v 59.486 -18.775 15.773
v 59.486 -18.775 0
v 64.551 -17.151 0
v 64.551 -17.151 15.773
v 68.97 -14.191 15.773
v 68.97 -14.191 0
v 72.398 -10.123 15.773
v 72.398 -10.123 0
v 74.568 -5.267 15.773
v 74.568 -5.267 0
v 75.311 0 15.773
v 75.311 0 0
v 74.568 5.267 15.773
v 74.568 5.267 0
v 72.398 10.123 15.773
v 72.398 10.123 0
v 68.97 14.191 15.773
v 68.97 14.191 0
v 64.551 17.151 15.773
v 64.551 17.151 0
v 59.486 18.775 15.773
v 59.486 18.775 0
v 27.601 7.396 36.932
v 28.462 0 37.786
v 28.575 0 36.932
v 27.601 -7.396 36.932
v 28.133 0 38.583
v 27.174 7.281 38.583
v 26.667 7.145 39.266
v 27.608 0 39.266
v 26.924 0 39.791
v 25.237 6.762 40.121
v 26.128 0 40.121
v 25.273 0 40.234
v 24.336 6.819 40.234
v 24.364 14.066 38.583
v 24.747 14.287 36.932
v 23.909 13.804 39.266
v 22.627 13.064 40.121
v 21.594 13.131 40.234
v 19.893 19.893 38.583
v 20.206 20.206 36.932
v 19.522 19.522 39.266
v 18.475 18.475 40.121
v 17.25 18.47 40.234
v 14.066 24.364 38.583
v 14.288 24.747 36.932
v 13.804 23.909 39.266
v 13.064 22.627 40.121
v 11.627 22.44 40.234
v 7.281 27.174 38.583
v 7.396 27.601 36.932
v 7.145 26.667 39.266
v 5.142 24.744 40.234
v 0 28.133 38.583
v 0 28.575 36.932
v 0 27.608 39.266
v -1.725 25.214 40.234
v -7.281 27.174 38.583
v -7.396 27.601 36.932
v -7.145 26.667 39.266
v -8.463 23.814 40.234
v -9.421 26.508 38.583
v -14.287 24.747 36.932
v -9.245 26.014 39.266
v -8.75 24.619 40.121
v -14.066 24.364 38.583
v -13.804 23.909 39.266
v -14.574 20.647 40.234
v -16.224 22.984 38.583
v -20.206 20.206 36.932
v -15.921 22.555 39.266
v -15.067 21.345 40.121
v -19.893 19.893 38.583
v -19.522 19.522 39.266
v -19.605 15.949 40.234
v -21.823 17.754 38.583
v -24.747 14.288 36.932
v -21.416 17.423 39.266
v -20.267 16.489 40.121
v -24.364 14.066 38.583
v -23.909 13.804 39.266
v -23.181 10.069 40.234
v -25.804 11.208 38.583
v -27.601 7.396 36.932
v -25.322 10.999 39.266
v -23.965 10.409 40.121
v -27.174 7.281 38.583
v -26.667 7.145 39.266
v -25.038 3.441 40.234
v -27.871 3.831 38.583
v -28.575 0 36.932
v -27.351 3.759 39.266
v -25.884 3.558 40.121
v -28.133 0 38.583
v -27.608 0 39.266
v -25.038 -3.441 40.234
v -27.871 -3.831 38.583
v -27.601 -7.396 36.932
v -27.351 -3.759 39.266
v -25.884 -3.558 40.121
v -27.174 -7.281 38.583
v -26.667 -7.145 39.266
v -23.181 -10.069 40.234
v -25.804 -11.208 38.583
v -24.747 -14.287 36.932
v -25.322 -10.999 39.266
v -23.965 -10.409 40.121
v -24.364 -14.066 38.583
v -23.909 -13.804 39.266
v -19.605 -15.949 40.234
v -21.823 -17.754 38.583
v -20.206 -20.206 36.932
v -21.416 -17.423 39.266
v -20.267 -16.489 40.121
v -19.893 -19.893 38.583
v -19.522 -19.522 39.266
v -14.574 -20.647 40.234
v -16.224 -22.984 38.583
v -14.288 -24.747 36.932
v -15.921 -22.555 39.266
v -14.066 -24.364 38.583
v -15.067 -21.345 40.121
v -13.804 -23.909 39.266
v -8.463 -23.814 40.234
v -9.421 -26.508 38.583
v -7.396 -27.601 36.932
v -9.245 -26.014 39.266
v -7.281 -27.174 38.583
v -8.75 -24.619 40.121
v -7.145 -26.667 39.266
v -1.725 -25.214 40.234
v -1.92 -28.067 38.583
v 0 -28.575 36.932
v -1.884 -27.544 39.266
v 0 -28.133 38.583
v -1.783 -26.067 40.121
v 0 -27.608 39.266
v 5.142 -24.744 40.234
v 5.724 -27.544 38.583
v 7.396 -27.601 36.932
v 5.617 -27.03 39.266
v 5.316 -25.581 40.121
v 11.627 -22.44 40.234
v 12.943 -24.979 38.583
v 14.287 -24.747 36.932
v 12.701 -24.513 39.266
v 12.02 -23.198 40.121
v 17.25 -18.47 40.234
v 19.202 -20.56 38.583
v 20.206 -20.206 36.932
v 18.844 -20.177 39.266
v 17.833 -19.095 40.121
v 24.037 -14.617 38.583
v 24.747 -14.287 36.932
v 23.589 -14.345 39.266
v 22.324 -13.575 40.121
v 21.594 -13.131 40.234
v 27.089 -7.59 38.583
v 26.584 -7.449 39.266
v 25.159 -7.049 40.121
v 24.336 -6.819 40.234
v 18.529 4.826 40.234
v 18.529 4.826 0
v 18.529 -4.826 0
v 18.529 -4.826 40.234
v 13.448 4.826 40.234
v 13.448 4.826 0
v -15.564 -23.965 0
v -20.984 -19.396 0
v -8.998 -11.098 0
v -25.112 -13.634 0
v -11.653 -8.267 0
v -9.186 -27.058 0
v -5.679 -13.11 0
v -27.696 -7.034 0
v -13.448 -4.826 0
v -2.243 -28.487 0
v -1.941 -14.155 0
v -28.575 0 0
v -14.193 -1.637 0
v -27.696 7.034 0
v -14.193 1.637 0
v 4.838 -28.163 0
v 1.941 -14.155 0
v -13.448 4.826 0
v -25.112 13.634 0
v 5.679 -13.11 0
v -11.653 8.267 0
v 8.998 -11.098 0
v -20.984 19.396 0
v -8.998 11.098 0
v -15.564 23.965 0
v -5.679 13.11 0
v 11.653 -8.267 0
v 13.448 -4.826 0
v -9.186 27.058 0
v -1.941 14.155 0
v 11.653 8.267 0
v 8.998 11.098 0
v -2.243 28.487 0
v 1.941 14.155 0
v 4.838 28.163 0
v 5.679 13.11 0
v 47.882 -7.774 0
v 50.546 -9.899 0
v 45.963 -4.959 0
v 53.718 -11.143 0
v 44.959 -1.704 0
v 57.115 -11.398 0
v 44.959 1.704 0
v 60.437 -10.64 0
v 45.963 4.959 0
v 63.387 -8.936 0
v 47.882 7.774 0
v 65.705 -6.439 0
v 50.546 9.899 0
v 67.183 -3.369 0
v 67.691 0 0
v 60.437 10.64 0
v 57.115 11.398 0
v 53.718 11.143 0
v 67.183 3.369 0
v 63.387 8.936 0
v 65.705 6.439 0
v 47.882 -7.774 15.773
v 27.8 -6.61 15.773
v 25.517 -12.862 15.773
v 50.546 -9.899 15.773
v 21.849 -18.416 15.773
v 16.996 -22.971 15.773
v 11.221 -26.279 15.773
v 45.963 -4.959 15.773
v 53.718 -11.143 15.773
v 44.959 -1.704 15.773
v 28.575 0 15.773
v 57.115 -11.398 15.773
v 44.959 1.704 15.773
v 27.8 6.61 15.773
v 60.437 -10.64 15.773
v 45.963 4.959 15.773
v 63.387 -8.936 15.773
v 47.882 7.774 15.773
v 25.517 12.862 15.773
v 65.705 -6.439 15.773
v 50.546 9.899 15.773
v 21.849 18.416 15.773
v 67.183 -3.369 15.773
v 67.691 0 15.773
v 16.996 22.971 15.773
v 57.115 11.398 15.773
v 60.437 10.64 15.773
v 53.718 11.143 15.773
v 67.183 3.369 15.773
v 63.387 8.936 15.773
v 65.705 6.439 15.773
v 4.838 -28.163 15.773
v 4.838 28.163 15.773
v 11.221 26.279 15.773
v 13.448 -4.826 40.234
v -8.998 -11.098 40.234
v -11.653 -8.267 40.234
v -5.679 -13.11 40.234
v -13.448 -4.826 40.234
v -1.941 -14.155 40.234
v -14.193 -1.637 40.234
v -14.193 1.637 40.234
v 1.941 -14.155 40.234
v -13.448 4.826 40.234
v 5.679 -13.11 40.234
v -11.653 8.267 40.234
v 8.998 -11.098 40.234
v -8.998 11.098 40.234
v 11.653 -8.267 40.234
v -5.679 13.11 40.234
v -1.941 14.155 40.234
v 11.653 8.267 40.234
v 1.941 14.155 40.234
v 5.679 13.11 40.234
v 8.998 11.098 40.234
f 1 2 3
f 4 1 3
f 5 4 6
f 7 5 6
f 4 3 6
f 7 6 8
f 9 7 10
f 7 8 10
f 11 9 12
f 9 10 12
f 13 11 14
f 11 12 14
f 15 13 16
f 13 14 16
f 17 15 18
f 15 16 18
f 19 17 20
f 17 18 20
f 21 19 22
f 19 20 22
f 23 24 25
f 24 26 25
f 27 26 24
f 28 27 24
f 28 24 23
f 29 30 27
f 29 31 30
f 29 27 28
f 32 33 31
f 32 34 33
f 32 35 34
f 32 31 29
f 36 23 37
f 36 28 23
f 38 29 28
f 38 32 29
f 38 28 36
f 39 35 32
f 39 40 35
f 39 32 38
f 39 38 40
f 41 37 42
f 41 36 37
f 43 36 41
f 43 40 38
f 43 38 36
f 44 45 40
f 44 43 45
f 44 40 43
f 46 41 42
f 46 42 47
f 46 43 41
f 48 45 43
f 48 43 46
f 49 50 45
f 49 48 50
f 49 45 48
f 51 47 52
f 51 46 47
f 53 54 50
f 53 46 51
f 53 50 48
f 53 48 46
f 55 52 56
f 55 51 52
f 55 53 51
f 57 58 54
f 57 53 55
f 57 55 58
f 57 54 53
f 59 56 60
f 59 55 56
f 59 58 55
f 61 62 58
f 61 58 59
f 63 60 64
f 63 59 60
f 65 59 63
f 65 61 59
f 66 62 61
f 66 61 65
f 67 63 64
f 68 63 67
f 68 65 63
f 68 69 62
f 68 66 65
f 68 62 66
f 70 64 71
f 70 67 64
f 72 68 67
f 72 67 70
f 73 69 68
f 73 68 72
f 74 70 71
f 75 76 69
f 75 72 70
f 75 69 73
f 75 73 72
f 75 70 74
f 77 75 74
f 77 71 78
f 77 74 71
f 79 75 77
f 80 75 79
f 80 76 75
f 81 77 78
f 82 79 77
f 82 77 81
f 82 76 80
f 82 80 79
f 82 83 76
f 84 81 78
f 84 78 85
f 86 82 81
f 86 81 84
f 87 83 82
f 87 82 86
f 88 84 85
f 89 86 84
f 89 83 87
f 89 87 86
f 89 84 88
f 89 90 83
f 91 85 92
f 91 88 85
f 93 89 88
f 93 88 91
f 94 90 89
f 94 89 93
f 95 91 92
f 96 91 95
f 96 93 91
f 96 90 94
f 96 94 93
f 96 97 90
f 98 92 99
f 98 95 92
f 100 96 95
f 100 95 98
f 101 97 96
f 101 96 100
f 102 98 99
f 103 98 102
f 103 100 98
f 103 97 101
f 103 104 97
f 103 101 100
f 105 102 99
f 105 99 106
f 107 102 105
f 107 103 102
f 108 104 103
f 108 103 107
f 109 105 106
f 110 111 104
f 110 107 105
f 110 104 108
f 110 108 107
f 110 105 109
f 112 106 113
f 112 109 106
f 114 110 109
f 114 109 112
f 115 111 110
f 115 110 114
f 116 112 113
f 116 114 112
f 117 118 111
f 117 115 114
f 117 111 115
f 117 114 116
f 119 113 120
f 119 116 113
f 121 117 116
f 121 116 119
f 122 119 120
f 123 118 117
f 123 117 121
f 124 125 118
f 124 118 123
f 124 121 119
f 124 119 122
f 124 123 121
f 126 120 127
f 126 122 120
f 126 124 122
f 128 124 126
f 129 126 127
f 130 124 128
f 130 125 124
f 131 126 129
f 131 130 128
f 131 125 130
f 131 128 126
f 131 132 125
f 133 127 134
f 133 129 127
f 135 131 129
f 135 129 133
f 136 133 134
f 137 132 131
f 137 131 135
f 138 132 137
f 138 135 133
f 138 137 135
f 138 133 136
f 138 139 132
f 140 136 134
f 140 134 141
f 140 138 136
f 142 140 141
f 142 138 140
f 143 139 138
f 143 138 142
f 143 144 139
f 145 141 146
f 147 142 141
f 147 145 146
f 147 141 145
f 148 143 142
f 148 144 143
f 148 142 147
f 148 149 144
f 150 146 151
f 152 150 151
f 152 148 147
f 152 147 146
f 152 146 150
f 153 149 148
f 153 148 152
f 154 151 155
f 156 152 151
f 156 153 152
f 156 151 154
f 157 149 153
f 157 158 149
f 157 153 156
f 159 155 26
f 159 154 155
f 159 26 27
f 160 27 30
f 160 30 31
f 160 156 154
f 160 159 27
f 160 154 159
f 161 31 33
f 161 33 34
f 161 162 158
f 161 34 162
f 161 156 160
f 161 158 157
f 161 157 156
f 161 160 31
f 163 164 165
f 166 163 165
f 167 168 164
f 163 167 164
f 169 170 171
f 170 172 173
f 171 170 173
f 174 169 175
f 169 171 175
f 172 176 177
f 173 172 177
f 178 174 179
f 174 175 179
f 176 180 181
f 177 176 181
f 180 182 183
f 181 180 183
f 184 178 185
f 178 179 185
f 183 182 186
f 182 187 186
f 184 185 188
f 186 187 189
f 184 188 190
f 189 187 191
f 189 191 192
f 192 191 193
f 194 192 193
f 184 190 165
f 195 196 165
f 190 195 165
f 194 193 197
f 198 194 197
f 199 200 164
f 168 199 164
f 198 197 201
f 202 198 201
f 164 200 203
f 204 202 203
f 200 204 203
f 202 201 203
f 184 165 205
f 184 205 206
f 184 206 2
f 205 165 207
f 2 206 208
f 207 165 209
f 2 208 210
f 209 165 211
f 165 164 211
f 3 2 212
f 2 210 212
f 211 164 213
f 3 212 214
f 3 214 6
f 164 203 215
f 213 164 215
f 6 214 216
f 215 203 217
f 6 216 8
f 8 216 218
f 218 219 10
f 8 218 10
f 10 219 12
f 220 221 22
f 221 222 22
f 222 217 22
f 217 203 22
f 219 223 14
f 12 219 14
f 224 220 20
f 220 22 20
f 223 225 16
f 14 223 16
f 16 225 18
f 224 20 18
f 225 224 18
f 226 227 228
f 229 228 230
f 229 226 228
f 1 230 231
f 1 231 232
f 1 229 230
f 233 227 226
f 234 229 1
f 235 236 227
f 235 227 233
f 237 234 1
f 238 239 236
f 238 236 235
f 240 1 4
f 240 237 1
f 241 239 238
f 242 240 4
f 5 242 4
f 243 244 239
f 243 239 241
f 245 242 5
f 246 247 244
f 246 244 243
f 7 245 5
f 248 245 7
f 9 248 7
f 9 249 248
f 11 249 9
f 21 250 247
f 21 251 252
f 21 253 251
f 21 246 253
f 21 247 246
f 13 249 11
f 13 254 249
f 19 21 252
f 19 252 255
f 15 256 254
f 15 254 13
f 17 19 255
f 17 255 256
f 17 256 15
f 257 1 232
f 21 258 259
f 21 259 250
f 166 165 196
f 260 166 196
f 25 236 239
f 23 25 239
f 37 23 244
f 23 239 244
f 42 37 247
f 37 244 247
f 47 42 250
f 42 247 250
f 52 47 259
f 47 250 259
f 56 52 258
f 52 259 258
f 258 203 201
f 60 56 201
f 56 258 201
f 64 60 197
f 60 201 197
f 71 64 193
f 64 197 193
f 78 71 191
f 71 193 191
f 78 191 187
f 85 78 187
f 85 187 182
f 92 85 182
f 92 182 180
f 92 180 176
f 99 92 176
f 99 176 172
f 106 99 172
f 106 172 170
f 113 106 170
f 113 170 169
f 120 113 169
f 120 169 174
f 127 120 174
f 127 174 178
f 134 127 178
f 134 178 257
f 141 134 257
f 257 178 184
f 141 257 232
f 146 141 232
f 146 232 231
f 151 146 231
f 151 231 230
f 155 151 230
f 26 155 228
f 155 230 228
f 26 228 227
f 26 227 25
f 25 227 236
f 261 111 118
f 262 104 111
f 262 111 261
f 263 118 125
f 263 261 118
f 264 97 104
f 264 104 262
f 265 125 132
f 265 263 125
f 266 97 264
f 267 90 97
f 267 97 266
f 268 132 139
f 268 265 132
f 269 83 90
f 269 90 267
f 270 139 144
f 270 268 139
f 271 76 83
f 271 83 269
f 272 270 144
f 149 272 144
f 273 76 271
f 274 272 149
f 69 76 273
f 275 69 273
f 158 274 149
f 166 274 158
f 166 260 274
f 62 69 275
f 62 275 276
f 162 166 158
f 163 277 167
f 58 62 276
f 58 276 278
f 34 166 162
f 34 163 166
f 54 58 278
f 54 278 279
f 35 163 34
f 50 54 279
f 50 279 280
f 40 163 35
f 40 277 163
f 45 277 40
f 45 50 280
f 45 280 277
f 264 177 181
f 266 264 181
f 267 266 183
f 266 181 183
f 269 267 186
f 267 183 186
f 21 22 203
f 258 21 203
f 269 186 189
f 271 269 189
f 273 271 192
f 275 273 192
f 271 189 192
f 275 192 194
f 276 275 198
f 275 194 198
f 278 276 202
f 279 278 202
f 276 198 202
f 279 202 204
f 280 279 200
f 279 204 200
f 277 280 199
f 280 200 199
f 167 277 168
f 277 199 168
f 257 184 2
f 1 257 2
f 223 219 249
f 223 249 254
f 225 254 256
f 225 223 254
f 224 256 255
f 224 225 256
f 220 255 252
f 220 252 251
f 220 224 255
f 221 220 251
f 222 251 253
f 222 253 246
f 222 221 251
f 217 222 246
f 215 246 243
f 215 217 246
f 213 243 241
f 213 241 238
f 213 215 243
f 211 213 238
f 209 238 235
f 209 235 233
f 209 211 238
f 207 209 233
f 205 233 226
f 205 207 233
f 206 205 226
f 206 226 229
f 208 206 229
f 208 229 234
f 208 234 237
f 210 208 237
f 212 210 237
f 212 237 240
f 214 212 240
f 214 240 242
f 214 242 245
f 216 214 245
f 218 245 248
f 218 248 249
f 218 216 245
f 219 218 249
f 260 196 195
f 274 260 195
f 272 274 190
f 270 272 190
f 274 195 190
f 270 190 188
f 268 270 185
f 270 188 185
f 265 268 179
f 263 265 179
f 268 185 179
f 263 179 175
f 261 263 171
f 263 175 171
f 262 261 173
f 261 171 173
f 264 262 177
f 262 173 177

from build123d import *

# Parameters (mm, degrees)
F0_R     = 11.43
F1_DEPTH = 15.7734
F2_DEPTH = 40.2336
F3_R     = 3.302


with BuildPart() as f1:
    # F0 (on Top) → F1 (new body)
    with BuildSketch(Plane.XY):
        with BuildLine():
            ThreePointArc((4.8377539503, 28.162506311), (21.8491354993, 18.4159143931), (28.575, 0))
            ThreePointArc((28.575, 0), (21.8491354993, -18.4159143931), (4.8377539503, -28.162506311))
            Line((4.8377539503, -28.162506311), (59.4861693002, -18.7750042073))
            ThreePointArc((59.4861693002, -18.7750042073), (37.211, 0), (59.4861693002, 18.7750042073))
            Line((59.4861693002, 18.7750042073), (4.8377539503, 28.162506311))
        make_face()
        with BuildLine():
            ThreePointArc((75.311, 0), (70.8270903328, 12.2772762621), (59.4861693002, 18.7750042073))
            ThreePointArc((59.4861693002, 18.7750042073), (37.211, 0), (59.4861693002, -18.7750042073))
            ThreePointArc((59.4861693002, -18.7750042073), (70.8270903328, -12.2772762621), (75.311, 0))
        make_face()
        with Locations((56.261, 0)):
            Circle(F0_R, mode=Mode.SUBTRACT)
    extrude(amount=F1_DEPTH)

    # F0 (on Top) → F2 (join)
    with BuildSketch(Plane.XY):
        with BuildLine():
            ThreePointArc((4.8377539503, -28.162506311), (21.8491354993, -18.4159143931), (28.575, 0))
            ThreePointArc((28.575, 0), (21.8491354993, 18.4159143931), (4.8377539503, 28.162506311))
            ThreePointArc((4.8377539503, 28.162506311), (-28.575, 0), (4.8377539503, -28.162506311))
        make_face()
        with BuildLine():
            ThreePointArc((-13.4477648793, 4.826), (0, 14.2875), (13.4477648793, 4.826))
            Line((13.4477648793, 4.826), (18.5293, 4.826))
            Line((18.5293, 4.826), (18.5293, -4.826))
            Line((18.5293, -4.826), (13.4477648793, -4.826))
            ThreePointArc((13.4477648793, -4.826), (0, -14.2875), (-13.4477648793, -4.826))
            Line((-13.4477648793, -4.826), (-18.5293, -4.826))
            Line((-18.5293, -4.826), (-18.5293, 4.826))
            Line((-18.5293, 4.826), (-13.4477648793, 4.826))
        make_face(mode=Mode.SUBTRACT)
        with BuildLine():
            ThreePointArc((-13.4477648793, -4.826), (-14.2875, 0), (-13.4477648793, 4.826))
            Line((-13.4477648793, 4.826), (-18.5293, 4.826))
            Line((-18.5293, 4.826), (-18.5293, -4.826))
            Line((-18.5293, -4.826), (-13.4477648793, -4.826))
        make_face()
    extrude(amount=F2_DEPTH)

    # F3
    f3_edges = [f1.edges().sort_by_distance(p)[0] for p in [
        (-28.575, 0, 40.2336),
    ]]
    fillet(f3_edges, radius=F3_R)


solid = f1.part
